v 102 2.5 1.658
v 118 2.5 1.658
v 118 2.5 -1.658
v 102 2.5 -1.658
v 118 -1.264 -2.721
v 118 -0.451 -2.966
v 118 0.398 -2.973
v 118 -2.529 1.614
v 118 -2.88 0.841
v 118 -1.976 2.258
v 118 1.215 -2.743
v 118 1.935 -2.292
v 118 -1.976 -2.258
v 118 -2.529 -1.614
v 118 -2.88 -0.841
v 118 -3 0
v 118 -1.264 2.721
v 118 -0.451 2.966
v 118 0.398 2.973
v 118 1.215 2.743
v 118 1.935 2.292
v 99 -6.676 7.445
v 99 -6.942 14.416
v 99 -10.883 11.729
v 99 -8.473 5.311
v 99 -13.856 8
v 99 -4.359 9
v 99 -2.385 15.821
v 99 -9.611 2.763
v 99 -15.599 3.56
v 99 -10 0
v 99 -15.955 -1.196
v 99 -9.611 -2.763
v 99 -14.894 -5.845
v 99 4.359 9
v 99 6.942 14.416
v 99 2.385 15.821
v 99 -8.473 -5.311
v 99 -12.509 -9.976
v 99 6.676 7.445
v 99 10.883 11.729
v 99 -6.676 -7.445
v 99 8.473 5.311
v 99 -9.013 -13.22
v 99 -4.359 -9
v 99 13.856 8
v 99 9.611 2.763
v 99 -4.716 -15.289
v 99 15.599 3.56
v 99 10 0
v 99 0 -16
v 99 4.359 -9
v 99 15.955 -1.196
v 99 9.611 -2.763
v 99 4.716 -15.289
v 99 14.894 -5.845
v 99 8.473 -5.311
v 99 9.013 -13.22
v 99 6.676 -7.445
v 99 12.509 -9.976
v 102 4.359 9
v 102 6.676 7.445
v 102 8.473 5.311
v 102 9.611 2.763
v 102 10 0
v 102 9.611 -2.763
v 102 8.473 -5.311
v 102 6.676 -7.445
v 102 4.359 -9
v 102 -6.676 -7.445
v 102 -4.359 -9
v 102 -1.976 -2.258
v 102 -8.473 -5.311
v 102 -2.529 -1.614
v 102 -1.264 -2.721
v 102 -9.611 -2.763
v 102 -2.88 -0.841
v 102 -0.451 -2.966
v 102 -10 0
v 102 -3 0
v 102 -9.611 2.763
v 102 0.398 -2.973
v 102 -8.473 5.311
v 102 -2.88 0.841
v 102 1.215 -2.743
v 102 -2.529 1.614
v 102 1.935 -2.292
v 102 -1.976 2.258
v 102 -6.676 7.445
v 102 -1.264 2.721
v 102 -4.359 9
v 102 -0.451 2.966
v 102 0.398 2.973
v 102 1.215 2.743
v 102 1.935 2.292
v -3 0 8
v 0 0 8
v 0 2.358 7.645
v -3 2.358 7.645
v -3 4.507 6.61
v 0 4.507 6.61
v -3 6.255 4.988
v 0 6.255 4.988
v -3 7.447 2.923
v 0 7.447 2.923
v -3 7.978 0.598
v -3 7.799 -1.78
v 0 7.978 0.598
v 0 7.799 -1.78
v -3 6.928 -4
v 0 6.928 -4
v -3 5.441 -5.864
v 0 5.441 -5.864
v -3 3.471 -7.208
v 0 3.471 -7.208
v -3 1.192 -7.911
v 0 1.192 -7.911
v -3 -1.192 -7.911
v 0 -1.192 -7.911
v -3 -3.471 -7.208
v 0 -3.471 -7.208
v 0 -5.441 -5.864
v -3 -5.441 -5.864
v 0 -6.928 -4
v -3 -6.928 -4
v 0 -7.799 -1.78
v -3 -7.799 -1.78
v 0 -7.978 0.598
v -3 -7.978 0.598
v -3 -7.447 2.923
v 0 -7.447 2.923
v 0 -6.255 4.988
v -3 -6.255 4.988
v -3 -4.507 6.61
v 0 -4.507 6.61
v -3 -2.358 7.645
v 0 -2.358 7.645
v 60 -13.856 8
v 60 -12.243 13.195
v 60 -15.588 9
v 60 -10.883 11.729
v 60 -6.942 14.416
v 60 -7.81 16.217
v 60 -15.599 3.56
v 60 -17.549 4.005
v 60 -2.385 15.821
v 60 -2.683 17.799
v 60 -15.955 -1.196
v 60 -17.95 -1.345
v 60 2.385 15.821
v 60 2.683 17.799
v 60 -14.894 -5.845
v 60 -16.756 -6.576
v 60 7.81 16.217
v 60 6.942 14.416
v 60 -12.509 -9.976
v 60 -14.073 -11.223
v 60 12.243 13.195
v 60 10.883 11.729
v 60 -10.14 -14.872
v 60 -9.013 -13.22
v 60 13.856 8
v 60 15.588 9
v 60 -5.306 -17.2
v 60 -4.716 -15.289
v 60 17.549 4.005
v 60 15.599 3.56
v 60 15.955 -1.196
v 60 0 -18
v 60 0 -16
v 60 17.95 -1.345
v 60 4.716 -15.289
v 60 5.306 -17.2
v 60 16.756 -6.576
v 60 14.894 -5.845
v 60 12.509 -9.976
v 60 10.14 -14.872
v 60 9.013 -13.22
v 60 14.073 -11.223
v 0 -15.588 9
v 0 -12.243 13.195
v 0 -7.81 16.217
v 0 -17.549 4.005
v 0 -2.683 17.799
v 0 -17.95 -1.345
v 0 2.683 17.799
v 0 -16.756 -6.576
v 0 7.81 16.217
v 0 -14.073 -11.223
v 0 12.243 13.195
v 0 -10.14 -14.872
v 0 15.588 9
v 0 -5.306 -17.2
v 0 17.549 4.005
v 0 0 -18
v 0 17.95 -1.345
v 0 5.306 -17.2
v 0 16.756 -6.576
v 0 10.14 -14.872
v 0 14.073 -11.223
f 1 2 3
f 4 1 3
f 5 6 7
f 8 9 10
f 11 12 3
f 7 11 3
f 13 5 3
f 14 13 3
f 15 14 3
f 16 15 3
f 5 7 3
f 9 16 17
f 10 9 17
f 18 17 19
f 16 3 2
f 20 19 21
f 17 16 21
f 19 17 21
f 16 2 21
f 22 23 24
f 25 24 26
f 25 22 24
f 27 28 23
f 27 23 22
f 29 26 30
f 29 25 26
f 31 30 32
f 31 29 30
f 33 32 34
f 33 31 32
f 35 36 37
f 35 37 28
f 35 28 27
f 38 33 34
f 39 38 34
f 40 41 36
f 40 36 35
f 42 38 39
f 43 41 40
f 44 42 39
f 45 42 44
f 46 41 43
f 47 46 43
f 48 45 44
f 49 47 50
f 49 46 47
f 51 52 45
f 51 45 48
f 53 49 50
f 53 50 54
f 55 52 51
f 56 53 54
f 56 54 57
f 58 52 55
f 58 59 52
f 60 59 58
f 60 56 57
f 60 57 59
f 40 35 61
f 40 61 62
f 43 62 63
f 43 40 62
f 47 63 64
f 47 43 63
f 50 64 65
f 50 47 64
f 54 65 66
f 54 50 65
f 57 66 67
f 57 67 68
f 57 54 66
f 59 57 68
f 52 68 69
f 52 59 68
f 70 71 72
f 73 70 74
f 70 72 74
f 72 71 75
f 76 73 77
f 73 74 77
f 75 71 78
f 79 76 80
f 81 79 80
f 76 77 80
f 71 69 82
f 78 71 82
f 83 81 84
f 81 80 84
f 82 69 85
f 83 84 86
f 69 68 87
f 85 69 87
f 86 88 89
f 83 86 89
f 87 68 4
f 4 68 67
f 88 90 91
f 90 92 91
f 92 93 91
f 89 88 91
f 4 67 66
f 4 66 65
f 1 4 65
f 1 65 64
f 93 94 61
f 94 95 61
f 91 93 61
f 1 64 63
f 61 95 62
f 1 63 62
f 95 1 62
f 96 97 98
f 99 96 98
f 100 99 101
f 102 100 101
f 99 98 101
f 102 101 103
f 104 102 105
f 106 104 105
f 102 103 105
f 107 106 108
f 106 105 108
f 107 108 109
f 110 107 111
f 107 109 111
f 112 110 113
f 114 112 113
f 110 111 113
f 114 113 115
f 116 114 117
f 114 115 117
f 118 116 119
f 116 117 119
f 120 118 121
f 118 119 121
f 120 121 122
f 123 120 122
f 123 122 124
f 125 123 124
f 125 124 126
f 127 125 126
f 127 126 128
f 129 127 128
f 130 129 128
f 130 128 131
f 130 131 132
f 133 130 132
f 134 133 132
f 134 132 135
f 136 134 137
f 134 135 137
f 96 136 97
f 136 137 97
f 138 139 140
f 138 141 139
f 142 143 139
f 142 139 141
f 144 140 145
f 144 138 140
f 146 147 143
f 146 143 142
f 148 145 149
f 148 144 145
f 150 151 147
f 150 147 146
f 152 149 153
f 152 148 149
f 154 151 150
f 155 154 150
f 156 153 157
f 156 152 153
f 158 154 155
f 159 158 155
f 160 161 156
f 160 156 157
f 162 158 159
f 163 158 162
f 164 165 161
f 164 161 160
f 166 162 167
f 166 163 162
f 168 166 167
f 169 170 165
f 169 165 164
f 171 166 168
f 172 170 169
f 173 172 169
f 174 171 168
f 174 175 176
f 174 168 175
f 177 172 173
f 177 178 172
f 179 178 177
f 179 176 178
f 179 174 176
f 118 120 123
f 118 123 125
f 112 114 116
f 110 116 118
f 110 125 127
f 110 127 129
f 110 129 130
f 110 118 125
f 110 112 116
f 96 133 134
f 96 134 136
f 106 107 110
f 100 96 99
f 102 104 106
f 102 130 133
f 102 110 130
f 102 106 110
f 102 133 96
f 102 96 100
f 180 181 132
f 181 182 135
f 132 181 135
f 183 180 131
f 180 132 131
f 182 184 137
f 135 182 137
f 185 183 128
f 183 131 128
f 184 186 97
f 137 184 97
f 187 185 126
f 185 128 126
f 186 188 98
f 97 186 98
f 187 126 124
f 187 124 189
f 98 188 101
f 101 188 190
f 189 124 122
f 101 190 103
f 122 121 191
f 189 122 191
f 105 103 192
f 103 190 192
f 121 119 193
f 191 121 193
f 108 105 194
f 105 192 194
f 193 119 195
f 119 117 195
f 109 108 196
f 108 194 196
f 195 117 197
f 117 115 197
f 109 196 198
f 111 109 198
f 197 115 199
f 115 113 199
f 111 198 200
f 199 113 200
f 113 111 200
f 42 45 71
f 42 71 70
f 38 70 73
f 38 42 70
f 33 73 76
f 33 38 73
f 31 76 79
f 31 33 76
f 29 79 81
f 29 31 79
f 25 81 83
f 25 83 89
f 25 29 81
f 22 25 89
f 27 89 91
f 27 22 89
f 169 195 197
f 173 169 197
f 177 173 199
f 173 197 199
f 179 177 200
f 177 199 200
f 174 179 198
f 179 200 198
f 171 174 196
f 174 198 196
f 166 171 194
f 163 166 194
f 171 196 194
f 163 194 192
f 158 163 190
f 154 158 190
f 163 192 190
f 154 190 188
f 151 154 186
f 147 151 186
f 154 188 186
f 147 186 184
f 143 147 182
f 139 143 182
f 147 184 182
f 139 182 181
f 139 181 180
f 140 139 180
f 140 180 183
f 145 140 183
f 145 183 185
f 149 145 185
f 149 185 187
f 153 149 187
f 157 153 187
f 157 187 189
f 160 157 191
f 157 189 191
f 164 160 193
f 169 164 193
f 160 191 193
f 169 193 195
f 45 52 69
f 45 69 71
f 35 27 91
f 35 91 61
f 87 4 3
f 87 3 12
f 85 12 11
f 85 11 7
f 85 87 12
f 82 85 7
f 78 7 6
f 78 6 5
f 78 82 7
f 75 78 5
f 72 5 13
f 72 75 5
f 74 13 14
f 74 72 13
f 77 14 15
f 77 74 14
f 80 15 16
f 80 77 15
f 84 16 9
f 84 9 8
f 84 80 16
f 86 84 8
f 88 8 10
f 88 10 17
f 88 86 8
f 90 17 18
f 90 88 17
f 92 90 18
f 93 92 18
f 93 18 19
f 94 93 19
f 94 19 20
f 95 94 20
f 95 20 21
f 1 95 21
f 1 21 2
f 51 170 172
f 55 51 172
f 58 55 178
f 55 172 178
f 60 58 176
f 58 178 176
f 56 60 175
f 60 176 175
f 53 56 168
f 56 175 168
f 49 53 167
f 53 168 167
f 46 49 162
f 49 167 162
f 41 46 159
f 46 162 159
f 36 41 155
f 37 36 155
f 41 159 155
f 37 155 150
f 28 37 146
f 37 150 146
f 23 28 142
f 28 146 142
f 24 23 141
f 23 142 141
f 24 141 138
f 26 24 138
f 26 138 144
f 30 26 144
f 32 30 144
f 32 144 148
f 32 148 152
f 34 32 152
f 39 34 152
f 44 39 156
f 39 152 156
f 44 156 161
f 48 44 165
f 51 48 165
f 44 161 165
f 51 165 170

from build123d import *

# Parameters (mm, degrees)
SKETCH1_R           = 18
BOSS_EXTRUDE1_DEPTH = 60
SKETCH2_R           = 8
BOSS_EXTRUDE2_DEPTH = 3
SKETCH3_R           = 16
BOSS_EXTRUDE3_DEPTH = 39
BOSS_EXTRUDE4_DEPTH = 3
BOSS_EXTRUDE5_DEPTH = 16


with BuildPart() as part:
    # Sketch1 → Boss-Extrude1 (new body)
    with BuildSketch(Plane(origin=(0, 0, 0), x_dir=(0, 0, -1), z_dir=(1, 0, 0))):
        Circle(SKETCH1_R)
    extrude(amount=BOSS_EXTRUDE1_DEPTH)

    # Sketch2 → Boss-Extrude2 (add)
    with BuildSketch(Plane.ZY):
        Circle(SKETCH2_R)
    extrude(amount=BOSS_EXTRUDE2_DEPTH)

    # Sketch3 → Boss-Extrude3 (add)
    with BuildSketch(Plane(origin=(60, 0, 0), x_dir=(0, 0, -1), z_dir=(1, 0, 0))):
        Circle(SKETCH3_R)
    extrude(amount=BOSS_EXTRUDE3_DEPTH)

    # Sketch4 → Boss-Extrude4 (add)
    with BuildSketch(Plane(origin=(99, 0, 0), x_dir=(0, 0, -1), z_dir=(1, 0, 0))):
        with BuildLine():
            Line((9, 4.358898944), (9, -4.358898944))
            ThreePointArc((9, -4.358898944), (0, -10), (-9, -4.358898944))
            Line((-9, -4.358898944), (-9, 4.358898944))
            ThreePointArc((-9, 4.358898944), (0, 10), (9, 4.358898944))
        make_face()
    extrude(amount=BOSS_EXTRUDE4_DEPTH)

    # Sketch5 → Boss-Extrude5 (add)
    with BuildSketch(Plane(origin=(102, 0, 0), x_dir=(0, 0, -1), z_dir=(1, 0, 0))):
        with BuildLine():
            Line((-1.658312395, 2.5), (1.658312395, 2.5))
            ThreePointArc((1.658312395, 2.5), (0, -3), (-1.658312395, 2.5))
        make_face()
    extrude(amount=BOSS_EXTRUDE5_DEPTH)


solid = part.part
